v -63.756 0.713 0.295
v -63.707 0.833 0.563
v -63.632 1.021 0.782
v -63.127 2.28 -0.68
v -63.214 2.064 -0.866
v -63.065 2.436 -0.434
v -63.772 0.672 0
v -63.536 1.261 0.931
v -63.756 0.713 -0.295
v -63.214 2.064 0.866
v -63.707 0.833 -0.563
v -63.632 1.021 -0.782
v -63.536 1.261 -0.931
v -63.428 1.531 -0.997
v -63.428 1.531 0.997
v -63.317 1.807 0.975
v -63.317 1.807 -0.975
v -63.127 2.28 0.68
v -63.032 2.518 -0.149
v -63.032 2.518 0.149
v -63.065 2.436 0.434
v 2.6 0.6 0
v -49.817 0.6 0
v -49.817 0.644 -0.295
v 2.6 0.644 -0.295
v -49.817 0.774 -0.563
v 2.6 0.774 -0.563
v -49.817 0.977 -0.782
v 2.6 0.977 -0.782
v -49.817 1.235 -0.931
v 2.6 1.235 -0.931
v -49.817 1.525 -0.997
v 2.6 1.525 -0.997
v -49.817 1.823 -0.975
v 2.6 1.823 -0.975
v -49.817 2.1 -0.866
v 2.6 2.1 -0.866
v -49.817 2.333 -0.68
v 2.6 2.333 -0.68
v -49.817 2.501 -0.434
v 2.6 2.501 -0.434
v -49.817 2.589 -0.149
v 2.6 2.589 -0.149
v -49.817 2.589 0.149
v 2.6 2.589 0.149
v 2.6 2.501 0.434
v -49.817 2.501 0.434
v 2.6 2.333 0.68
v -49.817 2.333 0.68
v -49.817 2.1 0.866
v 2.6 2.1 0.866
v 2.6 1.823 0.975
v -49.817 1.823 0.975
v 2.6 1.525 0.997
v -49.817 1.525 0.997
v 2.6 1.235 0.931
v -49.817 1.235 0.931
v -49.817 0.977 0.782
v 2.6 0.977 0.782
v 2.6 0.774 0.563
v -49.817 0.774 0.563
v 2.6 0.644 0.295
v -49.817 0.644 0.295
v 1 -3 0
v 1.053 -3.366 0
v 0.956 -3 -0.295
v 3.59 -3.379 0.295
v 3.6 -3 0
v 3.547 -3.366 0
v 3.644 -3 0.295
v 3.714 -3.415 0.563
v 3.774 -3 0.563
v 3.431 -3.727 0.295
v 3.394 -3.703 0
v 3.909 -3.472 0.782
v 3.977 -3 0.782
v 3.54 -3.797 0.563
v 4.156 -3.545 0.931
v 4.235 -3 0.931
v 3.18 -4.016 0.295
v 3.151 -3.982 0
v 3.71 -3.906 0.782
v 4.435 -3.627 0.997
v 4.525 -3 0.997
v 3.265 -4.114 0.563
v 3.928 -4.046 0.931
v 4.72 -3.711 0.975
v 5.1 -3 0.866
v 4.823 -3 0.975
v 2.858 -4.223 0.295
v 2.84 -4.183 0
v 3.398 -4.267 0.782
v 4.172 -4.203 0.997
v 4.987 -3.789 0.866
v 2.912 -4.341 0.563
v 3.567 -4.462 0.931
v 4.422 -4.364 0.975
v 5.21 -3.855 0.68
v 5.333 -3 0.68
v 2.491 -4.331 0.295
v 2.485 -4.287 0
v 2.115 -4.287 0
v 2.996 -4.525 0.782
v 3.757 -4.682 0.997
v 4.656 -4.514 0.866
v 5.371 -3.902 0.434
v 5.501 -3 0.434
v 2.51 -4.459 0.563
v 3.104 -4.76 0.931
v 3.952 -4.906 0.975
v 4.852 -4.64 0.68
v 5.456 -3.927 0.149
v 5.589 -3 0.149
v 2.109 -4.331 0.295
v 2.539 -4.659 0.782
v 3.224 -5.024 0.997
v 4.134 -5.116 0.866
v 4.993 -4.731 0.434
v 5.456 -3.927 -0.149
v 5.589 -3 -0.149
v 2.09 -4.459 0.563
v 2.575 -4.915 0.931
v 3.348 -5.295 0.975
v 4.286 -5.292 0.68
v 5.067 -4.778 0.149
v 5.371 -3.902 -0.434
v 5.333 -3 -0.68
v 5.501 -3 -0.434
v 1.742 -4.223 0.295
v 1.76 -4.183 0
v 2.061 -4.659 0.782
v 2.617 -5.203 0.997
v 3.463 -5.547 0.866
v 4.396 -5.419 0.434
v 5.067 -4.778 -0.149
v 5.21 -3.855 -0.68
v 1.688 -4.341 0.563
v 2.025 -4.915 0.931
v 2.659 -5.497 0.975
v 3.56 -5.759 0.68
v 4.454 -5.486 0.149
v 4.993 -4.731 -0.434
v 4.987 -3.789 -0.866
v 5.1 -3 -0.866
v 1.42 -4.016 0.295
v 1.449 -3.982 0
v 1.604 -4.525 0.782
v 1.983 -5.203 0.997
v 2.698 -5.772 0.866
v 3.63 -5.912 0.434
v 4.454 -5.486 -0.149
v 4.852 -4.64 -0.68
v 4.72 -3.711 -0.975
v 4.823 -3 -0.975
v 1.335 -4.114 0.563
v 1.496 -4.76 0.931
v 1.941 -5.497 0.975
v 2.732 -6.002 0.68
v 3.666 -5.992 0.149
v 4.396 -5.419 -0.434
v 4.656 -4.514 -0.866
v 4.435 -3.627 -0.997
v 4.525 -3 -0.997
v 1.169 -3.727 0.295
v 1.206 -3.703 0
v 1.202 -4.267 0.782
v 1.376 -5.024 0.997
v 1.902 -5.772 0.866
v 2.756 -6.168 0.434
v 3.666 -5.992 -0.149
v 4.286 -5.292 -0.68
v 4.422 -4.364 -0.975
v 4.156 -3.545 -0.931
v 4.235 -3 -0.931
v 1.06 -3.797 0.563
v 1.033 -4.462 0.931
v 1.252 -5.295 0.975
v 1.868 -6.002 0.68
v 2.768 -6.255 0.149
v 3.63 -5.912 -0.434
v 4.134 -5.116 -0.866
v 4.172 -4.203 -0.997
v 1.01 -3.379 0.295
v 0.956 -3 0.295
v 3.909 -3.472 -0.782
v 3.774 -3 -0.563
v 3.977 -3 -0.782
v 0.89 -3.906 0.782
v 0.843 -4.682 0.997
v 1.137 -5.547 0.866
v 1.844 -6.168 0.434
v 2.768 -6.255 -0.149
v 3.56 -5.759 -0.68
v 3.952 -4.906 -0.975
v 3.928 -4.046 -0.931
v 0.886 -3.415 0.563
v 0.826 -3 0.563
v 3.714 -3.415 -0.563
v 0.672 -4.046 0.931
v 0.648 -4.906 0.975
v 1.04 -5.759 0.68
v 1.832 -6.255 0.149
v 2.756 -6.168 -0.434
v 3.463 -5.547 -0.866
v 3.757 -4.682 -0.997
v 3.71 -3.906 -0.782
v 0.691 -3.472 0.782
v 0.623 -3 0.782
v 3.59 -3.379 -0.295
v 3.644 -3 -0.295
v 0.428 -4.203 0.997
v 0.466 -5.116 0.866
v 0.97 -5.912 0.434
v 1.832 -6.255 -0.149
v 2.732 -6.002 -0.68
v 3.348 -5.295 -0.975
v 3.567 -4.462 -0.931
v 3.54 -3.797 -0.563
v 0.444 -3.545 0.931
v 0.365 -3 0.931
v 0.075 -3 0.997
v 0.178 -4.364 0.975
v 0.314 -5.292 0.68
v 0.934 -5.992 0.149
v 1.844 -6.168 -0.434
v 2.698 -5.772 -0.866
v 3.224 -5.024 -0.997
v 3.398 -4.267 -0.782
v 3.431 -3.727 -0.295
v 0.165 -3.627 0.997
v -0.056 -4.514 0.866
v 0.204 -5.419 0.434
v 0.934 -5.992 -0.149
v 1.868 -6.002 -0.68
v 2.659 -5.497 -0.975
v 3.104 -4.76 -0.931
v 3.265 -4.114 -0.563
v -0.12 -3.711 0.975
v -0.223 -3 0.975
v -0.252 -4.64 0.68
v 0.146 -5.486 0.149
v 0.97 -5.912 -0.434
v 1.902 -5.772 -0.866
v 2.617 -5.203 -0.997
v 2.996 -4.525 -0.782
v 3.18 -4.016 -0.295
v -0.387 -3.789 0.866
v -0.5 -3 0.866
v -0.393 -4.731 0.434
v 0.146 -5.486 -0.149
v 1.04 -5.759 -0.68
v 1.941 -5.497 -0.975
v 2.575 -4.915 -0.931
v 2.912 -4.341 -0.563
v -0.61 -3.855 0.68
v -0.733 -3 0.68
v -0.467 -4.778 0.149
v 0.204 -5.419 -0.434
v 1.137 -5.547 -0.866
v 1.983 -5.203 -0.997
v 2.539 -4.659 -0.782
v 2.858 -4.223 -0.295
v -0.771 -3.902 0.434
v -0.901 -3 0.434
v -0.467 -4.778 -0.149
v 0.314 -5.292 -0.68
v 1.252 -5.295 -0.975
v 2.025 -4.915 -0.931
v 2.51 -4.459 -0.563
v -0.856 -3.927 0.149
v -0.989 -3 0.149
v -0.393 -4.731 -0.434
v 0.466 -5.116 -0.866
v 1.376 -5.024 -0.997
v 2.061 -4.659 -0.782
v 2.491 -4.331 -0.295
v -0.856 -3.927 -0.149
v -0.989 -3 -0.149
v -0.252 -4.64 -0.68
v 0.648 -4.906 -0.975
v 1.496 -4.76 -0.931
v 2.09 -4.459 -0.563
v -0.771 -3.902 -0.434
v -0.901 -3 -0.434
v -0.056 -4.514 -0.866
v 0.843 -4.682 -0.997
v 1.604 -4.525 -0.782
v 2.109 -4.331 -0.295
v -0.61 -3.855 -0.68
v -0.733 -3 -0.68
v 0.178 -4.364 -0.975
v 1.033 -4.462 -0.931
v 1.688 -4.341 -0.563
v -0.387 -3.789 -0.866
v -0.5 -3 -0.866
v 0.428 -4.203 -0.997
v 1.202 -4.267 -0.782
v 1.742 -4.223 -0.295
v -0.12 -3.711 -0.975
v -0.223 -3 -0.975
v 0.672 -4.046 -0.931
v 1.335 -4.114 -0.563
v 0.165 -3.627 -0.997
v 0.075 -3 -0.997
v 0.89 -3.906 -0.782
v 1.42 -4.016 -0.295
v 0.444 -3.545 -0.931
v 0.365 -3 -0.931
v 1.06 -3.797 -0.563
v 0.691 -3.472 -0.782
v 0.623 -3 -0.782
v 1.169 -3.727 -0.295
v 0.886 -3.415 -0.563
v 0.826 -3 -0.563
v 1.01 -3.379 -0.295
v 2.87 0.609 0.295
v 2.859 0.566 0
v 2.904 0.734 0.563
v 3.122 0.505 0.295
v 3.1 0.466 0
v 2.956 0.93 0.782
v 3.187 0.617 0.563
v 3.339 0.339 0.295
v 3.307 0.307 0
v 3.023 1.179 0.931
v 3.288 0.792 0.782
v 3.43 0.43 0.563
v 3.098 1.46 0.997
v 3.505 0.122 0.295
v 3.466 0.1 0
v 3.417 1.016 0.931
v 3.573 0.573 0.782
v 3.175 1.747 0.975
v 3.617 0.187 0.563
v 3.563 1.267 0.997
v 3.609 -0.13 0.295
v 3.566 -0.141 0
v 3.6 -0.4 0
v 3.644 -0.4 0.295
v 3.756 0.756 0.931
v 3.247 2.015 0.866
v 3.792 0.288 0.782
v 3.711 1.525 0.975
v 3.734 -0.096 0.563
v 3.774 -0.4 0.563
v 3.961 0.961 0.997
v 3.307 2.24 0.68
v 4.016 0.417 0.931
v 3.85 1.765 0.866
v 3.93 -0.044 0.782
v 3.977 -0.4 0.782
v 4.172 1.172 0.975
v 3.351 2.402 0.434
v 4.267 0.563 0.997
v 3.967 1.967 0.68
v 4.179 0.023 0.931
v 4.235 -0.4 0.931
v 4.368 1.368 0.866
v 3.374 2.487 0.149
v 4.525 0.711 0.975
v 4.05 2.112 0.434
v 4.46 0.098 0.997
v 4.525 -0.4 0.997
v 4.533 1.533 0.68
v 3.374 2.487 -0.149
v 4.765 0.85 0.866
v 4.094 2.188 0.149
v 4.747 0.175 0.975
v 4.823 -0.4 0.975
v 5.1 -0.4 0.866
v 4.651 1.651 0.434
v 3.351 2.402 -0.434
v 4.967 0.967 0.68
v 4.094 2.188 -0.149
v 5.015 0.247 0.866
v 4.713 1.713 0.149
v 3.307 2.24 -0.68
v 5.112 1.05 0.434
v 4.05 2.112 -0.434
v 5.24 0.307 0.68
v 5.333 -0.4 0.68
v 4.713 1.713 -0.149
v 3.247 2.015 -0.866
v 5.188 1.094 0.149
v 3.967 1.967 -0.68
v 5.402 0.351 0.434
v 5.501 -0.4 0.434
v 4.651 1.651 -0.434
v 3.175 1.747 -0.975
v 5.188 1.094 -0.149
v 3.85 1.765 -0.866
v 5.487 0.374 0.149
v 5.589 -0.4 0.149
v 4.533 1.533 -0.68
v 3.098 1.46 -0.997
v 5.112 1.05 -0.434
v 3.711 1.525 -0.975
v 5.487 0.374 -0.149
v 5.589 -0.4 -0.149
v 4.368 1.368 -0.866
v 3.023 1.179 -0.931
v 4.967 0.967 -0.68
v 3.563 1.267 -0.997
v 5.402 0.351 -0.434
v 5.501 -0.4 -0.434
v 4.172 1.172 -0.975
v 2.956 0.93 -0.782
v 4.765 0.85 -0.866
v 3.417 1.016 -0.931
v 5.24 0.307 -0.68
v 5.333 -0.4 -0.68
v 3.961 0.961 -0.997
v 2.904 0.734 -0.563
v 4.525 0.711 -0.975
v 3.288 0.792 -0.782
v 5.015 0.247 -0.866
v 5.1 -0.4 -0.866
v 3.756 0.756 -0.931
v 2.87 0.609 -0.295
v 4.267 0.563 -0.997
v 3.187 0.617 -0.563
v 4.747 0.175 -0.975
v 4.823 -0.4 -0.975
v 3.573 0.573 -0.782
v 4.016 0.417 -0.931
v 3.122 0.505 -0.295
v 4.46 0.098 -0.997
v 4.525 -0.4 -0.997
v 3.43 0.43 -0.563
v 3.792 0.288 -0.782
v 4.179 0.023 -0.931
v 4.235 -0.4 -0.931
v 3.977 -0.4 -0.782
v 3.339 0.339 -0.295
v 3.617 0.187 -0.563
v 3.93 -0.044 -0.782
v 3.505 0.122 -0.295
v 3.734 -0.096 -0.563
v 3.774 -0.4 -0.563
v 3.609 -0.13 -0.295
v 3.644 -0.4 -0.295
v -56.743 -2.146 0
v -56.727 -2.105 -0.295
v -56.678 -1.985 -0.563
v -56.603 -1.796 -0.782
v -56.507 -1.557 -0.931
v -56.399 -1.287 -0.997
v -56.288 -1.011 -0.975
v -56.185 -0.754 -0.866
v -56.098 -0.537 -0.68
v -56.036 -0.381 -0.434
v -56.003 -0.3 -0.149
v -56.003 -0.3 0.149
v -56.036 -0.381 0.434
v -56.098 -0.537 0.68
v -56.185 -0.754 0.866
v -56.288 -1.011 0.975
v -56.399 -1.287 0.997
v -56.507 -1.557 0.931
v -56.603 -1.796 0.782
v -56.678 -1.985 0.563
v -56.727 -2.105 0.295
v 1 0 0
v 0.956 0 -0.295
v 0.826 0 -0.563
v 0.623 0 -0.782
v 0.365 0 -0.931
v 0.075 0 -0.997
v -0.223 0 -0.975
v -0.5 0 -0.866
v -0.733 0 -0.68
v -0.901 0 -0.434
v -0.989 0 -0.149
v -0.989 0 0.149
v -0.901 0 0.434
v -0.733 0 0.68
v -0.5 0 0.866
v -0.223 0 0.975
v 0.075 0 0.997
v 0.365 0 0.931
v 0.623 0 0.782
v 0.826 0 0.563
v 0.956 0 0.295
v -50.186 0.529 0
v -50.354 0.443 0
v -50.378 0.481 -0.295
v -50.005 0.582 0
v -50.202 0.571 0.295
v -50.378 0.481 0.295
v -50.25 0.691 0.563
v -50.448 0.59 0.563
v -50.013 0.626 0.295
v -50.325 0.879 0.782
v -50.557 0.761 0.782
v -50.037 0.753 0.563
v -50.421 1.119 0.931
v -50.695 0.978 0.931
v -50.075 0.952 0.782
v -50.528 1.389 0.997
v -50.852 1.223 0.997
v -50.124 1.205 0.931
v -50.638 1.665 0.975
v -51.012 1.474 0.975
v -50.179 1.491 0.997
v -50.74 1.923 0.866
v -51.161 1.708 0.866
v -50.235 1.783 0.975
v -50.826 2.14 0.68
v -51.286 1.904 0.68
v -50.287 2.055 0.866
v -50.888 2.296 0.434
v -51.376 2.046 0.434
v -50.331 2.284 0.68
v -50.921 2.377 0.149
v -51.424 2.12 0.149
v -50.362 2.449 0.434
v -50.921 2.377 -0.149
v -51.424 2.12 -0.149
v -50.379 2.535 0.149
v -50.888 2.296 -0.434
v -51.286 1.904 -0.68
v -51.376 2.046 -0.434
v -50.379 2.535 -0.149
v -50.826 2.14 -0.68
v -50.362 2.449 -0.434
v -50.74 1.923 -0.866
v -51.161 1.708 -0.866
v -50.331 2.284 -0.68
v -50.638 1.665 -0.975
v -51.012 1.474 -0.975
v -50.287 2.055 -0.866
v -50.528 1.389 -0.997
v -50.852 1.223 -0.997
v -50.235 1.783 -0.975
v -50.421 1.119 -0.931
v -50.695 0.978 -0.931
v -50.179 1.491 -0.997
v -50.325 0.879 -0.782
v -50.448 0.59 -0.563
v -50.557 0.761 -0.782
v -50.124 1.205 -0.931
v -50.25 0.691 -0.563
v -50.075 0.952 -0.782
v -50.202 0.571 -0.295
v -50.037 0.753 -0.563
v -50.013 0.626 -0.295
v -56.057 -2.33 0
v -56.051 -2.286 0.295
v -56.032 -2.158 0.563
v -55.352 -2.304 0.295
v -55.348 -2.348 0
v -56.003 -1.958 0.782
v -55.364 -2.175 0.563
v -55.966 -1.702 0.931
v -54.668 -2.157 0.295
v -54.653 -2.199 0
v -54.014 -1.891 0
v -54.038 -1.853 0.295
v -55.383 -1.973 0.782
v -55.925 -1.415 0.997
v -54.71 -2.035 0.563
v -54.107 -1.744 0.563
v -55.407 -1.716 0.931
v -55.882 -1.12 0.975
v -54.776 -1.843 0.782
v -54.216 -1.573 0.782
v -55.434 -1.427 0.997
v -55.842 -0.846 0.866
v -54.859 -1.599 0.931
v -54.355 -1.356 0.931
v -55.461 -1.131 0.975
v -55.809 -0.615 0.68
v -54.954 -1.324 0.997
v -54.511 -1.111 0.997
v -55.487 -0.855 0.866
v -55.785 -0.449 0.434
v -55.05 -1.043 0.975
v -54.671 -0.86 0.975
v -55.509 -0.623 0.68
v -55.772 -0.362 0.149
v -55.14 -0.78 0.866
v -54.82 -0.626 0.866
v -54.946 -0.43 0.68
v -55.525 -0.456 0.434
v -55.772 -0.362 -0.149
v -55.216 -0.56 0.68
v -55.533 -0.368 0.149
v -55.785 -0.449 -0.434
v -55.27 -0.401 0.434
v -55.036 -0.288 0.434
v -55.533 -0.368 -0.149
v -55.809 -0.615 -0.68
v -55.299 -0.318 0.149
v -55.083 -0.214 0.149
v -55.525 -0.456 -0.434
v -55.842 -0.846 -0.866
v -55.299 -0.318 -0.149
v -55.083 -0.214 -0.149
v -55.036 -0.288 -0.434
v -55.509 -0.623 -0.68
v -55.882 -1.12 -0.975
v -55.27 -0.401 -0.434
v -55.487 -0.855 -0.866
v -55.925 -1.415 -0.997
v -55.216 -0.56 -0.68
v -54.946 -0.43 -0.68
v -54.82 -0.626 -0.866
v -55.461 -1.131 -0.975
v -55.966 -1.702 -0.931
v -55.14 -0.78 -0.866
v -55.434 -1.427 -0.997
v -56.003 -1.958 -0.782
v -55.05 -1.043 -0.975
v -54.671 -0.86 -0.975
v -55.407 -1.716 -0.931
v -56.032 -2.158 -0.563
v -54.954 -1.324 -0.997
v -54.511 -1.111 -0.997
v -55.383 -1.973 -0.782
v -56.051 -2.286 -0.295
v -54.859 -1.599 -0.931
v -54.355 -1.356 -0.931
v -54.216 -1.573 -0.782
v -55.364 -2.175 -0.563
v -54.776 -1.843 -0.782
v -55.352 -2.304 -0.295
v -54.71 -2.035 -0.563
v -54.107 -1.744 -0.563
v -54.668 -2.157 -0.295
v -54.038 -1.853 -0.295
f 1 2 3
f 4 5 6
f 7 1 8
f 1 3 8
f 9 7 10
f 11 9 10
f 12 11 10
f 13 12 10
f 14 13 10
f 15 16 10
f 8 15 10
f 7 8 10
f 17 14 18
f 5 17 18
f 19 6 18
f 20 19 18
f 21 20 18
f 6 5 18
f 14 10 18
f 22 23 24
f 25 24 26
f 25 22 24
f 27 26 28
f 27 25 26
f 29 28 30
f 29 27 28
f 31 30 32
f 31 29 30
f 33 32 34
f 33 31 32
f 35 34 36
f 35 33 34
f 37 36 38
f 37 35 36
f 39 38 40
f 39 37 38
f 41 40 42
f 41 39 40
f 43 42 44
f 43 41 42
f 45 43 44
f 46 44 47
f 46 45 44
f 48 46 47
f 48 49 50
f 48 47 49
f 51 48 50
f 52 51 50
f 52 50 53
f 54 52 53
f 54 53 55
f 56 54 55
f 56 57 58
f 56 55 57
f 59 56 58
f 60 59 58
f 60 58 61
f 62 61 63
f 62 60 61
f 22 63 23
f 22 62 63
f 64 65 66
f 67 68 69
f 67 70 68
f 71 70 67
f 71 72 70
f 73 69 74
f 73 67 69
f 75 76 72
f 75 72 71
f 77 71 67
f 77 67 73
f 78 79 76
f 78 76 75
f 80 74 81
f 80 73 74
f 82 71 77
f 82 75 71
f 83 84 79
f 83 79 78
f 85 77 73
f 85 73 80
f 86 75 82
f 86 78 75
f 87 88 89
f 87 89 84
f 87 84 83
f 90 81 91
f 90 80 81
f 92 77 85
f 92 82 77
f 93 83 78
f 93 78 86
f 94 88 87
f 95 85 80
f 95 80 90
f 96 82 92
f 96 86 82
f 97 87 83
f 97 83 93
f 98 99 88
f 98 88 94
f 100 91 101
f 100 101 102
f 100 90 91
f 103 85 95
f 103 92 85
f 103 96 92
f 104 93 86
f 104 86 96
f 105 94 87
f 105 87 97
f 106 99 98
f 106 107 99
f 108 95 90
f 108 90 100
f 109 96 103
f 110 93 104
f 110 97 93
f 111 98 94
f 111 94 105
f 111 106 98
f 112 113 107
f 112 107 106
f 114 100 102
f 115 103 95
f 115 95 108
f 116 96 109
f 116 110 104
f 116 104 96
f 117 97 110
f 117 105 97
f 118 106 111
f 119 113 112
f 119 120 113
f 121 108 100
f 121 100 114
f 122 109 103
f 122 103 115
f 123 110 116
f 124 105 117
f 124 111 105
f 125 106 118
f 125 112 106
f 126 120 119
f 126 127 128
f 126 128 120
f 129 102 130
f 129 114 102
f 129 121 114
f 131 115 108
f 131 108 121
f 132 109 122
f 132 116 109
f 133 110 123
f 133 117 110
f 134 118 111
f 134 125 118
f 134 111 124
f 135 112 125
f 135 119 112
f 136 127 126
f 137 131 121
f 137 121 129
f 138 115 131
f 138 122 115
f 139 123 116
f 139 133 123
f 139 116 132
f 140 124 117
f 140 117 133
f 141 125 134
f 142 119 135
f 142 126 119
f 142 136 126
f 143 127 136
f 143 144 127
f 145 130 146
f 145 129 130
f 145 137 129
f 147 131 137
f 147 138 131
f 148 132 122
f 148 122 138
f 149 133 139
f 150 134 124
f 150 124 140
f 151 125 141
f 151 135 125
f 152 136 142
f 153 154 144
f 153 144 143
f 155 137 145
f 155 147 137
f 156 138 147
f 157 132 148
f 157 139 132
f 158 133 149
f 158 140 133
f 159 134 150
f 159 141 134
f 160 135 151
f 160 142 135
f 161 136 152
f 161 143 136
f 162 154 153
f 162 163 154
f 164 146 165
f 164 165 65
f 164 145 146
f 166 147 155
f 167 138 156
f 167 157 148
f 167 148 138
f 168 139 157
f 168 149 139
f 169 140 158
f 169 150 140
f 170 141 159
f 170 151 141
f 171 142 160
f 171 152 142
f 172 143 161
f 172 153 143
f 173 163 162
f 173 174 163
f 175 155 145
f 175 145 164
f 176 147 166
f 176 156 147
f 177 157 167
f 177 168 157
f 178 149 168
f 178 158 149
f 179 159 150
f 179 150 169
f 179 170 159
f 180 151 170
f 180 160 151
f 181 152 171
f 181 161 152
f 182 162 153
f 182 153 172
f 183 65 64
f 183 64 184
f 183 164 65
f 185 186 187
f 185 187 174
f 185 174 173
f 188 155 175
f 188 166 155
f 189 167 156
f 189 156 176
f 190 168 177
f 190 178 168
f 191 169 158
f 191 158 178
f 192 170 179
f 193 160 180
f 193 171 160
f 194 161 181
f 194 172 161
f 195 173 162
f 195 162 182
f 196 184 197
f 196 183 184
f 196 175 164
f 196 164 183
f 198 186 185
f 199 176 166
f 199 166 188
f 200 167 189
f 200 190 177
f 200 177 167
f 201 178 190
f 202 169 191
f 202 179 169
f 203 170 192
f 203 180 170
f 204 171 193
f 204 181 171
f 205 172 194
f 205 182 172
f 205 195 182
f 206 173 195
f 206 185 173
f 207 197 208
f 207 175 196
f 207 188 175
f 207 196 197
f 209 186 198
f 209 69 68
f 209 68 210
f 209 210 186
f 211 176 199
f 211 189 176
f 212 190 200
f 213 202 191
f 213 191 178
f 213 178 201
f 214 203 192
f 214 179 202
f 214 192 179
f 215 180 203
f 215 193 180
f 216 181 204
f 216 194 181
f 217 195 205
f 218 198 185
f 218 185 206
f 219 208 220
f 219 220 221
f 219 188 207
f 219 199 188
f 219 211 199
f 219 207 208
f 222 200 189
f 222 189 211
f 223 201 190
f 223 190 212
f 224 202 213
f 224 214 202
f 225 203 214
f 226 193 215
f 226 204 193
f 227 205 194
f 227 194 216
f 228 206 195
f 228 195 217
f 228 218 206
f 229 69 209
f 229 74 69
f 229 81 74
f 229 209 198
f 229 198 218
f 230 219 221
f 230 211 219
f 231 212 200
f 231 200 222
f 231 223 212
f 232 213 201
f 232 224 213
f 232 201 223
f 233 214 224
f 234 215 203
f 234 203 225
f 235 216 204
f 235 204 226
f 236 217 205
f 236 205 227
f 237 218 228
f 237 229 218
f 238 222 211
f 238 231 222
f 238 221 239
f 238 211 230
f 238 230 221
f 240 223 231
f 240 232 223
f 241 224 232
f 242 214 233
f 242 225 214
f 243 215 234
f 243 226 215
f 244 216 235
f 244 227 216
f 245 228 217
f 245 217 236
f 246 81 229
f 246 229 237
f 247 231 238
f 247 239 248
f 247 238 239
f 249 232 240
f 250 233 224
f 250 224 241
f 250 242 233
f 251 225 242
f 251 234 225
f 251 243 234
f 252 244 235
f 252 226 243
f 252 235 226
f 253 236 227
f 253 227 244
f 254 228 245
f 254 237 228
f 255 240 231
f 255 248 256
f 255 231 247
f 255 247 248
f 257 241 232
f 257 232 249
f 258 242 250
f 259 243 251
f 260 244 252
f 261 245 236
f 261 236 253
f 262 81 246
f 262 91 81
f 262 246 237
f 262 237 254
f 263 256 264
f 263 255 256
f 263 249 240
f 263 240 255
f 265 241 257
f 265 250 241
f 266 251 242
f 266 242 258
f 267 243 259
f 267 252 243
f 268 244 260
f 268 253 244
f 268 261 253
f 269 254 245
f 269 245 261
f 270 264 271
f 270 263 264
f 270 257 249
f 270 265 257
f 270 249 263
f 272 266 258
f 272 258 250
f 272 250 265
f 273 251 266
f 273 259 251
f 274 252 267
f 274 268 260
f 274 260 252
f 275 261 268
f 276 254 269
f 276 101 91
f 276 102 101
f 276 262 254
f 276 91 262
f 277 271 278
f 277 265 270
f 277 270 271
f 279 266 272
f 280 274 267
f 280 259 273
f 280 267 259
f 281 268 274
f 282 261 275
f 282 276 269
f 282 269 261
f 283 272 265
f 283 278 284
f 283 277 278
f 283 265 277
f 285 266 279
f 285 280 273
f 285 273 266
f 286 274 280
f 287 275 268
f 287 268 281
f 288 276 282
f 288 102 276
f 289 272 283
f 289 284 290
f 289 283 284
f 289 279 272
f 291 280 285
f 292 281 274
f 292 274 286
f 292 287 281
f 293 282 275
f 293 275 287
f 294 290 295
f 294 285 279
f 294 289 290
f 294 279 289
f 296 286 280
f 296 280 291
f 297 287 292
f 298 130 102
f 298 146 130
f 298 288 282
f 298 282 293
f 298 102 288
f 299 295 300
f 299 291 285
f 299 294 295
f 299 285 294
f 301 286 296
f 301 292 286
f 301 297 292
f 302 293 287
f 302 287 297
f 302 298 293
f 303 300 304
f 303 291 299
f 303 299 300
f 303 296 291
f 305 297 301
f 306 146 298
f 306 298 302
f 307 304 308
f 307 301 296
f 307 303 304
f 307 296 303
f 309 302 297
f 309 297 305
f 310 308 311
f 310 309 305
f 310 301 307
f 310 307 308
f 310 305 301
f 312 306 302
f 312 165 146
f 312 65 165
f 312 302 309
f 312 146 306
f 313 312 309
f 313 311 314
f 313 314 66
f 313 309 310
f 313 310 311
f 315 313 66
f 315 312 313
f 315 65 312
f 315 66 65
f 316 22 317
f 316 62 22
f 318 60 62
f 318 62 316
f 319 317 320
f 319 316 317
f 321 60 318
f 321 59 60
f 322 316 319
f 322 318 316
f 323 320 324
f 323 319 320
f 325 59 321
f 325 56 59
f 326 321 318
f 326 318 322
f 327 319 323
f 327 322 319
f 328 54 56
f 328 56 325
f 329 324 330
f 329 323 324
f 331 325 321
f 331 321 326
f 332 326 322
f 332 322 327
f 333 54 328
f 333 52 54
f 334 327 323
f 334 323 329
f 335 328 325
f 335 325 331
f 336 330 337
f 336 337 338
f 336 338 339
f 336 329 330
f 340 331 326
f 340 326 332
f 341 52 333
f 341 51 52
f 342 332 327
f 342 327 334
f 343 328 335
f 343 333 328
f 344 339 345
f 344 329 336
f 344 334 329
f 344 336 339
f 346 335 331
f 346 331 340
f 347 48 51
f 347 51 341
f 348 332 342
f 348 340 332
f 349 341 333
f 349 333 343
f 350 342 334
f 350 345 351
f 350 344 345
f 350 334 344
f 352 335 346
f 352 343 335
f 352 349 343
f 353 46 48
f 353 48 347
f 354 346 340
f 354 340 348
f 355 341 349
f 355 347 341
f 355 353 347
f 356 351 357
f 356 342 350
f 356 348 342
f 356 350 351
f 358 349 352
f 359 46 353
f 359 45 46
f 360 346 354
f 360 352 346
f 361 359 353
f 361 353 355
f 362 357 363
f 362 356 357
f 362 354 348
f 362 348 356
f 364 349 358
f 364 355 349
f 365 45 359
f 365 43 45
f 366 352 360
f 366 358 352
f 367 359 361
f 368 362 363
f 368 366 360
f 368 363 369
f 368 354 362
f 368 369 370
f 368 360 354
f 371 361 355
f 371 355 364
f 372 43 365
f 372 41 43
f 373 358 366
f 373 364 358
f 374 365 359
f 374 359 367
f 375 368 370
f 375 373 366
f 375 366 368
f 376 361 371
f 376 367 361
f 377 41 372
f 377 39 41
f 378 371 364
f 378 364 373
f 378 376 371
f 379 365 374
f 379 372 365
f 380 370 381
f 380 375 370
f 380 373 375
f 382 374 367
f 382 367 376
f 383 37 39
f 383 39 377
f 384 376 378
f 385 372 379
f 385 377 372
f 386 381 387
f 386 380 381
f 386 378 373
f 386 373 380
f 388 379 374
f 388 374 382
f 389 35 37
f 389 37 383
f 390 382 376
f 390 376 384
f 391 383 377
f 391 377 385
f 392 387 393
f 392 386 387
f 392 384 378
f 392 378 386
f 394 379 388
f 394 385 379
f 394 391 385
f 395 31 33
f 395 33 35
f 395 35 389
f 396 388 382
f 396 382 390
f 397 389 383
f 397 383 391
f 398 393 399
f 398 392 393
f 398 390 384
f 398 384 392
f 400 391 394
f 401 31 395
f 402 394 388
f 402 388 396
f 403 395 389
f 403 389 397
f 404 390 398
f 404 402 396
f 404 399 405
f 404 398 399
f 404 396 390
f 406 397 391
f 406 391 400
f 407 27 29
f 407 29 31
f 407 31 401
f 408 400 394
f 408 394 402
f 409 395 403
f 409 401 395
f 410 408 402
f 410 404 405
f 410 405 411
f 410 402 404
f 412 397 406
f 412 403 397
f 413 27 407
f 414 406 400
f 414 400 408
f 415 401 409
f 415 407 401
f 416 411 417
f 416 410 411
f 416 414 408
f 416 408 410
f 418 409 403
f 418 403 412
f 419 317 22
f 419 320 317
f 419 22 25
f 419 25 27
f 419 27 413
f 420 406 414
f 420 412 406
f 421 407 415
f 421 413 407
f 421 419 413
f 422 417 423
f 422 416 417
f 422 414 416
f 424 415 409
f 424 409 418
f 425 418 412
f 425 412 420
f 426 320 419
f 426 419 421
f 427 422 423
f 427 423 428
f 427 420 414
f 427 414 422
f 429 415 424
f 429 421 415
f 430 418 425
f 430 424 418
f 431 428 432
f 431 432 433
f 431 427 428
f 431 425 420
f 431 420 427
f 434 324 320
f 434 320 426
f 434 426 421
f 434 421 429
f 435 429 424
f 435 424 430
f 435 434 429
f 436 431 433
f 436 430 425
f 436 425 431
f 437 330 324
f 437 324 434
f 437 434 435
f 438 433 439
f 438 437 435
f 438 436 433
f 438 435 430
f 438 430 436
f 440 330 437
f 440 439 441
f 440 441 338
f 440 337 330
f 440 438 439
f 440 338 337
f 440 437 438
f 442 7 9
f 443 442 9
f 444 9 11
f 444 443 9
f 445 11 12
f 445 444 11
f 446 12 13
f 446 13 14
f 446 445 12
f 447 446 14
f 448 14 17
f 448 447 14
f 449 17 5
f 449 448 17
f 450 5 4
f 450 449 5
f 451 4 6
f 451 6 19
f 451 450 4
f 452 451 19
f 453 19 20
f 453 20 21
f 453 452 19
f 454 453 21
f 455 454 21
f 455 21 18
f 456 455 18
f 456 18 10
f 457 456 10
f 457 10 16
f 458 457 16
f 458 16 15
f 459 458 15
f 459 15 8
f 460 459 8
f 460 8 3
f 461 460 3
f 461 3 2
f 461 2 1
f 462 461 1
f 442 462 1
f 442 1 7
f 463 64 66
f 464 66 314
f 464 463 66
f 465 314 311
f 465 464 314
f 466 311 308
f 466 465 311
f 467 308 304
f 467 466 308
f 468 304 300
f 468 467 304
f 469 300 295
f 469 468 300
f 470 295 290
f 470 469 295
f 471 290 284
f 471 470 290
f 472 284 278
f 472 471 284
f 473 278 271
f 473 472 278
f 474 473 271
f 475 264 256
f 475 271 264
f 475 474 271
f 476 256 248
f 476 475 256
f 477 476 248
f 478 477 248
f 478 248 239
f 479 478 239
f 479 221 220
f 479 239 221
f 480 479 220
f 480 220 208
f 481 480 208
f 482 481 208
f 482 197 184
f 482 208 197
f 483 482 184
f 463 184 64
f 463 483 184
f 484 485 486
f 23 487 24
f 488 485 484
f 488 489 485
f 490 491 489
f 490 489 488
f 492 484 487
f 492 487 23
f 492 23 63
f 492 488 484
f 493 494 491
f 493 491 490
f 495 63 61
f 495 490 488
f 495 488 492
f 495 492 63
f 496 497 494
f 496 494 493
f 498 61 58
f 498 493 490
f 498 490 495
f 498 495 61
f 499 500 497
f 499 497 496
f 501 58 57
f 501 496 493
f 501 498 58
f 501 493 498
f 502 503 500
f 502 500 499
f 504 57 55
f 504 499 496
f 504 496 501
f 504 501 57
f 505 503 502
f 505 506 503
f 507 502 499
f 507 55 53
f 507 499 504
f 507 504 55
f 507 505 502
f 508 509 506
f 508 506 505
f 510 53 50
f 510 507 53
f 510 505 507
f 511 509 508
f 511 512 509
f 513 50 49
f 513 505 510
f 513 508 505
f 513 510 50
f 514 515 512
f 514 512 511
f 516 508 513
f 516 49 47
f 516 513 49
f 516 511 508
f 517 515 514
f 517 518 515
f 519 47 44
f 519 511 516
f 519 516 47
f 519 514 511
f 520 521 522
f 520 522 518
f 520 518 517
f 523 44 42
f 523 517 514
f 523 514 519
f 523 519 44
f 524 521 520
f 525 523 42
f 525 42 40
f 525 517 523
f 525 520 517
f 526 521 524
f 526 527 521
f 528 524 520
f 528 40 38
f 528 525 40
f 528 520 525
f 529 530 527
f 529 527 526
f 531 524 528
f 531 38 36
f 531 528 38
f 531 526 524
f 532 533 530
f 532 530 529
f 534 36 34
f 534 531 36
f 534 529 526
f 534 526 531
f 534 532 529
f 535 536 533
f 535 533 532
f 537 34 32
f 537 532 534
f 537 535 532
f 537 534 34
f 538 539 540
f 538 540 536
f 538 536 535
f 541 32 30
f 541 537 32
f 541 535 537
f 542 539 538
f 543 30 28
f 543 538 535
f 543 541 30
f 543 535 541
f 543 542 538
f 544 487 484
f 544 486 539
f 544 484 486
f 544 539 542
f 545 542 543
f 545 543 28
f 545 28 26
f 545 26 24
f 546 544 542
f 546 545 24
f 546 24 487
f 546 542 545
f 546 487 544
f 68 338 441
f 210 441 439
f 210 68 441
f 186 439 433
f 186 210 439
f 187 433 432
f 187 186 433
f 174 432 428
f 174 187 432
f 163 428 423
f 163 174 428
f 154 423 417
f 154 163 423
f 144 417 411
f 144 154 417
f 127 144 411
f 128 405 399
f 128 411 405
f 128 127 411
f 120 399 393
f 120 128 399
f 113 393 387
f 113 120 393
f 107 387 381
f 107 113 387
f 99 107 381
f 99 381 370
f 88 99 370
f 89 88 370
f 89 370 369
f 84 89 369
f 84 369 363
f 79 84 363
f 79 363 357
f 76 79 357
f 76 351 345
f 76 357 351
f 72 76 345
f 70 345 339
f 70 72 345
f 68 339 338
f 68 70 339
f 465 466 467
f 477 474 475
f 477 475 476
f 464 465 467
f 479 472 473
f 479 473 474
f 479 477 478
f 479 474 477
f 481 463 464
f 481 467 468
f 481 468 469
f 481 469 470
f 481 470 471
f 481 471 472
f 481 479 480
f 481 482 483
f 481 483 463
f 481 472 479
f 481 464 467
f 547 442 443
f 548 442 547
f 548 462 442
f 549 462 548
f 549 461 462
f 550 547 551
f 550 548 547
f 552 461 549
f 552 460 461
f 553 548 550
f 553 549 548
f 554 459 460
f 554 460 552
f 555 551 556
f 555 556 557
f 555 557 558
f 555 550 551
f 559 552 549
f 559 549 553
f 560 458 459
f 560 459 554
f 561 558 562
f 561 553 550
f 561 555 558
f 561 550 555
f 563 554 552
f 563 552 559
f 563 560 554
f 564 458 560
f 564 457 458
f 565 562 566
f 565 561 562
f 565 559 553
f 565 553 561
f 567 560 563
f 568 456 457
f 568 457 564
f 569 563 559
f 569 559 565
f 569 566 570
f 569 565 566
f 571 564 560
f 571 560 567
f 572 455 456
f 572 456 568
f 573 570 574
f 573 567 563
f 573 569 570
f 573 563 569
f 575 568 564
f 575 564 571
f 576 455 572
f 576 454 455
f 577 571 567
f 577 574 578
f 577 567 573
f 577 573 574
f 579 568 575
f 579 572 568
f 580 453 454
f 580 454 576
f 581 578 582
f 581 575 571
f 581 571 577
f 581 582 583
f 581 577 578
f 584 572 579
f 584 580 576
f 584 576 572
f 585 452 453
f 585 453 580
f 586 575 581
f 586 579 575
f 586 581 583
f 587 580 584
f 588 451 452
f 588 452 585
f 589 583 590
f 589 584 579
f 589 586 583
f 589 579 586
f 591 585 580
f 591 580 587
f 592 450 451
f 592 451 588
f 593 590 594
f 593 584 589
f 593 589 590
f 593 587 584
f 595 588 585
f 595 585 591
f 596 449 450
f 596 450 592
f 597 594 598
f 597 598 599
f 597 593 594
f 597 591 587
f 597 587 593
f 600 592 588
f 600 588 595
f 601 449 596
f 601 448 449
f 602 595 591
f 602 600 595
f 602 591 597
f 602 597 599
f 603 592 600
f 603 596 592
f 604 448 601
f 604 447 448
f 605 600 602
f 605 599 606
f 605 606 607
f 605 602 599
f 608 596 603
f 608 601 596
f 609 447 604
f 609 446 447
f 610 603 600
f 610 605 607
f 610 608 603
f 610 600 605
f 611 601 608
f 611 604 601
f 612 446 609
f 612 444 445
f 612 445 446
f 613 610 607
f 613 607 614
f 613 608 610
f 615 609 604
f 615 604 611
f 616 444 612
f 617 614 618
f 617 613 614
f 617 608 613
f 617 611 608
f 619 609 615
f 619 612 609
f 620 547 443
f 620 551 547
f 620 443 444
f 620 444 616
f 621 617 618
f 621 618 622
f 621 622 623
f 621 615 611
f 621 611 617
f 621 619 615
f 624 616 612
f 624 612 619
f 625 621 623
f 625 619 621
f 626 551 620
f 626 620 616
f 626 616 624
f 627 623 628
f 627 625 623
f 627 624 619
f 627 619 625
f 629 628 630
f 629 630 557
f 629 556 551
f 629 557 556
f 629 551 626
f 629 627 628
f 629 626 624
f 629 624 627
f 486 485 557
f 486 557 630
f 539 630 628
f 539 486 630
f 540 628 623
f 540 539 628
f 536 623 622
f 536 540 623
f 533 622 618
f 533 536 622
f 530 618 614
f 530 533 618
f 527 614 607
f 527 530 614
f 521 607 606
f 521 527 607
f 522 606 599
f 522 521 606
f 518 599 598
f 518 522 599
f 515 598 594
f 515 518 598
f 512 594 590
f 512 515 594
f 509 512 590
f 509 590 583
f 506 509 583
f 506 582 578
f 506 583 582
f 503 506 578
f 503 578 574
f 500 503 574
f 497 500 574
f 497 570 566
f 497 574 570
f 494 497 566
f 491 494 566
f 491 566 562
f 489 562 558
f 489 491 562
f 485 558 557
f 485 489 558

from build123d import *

# Parameters (mm, degrees)
ESQUISSE2_R = 1


with BuildPart() as part:
    # Balayage1: sweep along a path in Esquisse1
    with BuildLine(Plane.XY) as balayage1_path:
        Line((-63.4, 1.6), (-56.371023239, -1.217761314))
        ThreePointArc((-56.371023239, -1.217761314), (-55.440643854, -1.352684575), (-54.551404356, -1.047621953))
        Line((-54.551404356, -1.047621953), (-50.891949681, 1.286251527))
        ThreePointArc((-50.891949681, 1.286251527), (-50.376649394, 1.519961335), (-49.816516844, 1.6))
        Line((-49.816516844, 1.6), (2.6, 1.6))
        ThreePointArc((2.6, 1.6), (4.014213562, 1.014213562), (4.6, -0.4))
        Line((4.6, -0.4), (4.6, -3))
        ThreePointArc((4.6, -3), (2.3, -5.3), (0, -3))
        Line((0, -3), (0, 0))
    # Esquisse2 → Balayage1 (sweep)
    with BuildSketch(Plane(origin=(0, 0, 0), x_dir=(1, 0, 0), z_dir=(0, 1, 0))):
        Circle(ESQUISSE2_R)
    sweep(path=balayage1_path.line)


solid = part.part
